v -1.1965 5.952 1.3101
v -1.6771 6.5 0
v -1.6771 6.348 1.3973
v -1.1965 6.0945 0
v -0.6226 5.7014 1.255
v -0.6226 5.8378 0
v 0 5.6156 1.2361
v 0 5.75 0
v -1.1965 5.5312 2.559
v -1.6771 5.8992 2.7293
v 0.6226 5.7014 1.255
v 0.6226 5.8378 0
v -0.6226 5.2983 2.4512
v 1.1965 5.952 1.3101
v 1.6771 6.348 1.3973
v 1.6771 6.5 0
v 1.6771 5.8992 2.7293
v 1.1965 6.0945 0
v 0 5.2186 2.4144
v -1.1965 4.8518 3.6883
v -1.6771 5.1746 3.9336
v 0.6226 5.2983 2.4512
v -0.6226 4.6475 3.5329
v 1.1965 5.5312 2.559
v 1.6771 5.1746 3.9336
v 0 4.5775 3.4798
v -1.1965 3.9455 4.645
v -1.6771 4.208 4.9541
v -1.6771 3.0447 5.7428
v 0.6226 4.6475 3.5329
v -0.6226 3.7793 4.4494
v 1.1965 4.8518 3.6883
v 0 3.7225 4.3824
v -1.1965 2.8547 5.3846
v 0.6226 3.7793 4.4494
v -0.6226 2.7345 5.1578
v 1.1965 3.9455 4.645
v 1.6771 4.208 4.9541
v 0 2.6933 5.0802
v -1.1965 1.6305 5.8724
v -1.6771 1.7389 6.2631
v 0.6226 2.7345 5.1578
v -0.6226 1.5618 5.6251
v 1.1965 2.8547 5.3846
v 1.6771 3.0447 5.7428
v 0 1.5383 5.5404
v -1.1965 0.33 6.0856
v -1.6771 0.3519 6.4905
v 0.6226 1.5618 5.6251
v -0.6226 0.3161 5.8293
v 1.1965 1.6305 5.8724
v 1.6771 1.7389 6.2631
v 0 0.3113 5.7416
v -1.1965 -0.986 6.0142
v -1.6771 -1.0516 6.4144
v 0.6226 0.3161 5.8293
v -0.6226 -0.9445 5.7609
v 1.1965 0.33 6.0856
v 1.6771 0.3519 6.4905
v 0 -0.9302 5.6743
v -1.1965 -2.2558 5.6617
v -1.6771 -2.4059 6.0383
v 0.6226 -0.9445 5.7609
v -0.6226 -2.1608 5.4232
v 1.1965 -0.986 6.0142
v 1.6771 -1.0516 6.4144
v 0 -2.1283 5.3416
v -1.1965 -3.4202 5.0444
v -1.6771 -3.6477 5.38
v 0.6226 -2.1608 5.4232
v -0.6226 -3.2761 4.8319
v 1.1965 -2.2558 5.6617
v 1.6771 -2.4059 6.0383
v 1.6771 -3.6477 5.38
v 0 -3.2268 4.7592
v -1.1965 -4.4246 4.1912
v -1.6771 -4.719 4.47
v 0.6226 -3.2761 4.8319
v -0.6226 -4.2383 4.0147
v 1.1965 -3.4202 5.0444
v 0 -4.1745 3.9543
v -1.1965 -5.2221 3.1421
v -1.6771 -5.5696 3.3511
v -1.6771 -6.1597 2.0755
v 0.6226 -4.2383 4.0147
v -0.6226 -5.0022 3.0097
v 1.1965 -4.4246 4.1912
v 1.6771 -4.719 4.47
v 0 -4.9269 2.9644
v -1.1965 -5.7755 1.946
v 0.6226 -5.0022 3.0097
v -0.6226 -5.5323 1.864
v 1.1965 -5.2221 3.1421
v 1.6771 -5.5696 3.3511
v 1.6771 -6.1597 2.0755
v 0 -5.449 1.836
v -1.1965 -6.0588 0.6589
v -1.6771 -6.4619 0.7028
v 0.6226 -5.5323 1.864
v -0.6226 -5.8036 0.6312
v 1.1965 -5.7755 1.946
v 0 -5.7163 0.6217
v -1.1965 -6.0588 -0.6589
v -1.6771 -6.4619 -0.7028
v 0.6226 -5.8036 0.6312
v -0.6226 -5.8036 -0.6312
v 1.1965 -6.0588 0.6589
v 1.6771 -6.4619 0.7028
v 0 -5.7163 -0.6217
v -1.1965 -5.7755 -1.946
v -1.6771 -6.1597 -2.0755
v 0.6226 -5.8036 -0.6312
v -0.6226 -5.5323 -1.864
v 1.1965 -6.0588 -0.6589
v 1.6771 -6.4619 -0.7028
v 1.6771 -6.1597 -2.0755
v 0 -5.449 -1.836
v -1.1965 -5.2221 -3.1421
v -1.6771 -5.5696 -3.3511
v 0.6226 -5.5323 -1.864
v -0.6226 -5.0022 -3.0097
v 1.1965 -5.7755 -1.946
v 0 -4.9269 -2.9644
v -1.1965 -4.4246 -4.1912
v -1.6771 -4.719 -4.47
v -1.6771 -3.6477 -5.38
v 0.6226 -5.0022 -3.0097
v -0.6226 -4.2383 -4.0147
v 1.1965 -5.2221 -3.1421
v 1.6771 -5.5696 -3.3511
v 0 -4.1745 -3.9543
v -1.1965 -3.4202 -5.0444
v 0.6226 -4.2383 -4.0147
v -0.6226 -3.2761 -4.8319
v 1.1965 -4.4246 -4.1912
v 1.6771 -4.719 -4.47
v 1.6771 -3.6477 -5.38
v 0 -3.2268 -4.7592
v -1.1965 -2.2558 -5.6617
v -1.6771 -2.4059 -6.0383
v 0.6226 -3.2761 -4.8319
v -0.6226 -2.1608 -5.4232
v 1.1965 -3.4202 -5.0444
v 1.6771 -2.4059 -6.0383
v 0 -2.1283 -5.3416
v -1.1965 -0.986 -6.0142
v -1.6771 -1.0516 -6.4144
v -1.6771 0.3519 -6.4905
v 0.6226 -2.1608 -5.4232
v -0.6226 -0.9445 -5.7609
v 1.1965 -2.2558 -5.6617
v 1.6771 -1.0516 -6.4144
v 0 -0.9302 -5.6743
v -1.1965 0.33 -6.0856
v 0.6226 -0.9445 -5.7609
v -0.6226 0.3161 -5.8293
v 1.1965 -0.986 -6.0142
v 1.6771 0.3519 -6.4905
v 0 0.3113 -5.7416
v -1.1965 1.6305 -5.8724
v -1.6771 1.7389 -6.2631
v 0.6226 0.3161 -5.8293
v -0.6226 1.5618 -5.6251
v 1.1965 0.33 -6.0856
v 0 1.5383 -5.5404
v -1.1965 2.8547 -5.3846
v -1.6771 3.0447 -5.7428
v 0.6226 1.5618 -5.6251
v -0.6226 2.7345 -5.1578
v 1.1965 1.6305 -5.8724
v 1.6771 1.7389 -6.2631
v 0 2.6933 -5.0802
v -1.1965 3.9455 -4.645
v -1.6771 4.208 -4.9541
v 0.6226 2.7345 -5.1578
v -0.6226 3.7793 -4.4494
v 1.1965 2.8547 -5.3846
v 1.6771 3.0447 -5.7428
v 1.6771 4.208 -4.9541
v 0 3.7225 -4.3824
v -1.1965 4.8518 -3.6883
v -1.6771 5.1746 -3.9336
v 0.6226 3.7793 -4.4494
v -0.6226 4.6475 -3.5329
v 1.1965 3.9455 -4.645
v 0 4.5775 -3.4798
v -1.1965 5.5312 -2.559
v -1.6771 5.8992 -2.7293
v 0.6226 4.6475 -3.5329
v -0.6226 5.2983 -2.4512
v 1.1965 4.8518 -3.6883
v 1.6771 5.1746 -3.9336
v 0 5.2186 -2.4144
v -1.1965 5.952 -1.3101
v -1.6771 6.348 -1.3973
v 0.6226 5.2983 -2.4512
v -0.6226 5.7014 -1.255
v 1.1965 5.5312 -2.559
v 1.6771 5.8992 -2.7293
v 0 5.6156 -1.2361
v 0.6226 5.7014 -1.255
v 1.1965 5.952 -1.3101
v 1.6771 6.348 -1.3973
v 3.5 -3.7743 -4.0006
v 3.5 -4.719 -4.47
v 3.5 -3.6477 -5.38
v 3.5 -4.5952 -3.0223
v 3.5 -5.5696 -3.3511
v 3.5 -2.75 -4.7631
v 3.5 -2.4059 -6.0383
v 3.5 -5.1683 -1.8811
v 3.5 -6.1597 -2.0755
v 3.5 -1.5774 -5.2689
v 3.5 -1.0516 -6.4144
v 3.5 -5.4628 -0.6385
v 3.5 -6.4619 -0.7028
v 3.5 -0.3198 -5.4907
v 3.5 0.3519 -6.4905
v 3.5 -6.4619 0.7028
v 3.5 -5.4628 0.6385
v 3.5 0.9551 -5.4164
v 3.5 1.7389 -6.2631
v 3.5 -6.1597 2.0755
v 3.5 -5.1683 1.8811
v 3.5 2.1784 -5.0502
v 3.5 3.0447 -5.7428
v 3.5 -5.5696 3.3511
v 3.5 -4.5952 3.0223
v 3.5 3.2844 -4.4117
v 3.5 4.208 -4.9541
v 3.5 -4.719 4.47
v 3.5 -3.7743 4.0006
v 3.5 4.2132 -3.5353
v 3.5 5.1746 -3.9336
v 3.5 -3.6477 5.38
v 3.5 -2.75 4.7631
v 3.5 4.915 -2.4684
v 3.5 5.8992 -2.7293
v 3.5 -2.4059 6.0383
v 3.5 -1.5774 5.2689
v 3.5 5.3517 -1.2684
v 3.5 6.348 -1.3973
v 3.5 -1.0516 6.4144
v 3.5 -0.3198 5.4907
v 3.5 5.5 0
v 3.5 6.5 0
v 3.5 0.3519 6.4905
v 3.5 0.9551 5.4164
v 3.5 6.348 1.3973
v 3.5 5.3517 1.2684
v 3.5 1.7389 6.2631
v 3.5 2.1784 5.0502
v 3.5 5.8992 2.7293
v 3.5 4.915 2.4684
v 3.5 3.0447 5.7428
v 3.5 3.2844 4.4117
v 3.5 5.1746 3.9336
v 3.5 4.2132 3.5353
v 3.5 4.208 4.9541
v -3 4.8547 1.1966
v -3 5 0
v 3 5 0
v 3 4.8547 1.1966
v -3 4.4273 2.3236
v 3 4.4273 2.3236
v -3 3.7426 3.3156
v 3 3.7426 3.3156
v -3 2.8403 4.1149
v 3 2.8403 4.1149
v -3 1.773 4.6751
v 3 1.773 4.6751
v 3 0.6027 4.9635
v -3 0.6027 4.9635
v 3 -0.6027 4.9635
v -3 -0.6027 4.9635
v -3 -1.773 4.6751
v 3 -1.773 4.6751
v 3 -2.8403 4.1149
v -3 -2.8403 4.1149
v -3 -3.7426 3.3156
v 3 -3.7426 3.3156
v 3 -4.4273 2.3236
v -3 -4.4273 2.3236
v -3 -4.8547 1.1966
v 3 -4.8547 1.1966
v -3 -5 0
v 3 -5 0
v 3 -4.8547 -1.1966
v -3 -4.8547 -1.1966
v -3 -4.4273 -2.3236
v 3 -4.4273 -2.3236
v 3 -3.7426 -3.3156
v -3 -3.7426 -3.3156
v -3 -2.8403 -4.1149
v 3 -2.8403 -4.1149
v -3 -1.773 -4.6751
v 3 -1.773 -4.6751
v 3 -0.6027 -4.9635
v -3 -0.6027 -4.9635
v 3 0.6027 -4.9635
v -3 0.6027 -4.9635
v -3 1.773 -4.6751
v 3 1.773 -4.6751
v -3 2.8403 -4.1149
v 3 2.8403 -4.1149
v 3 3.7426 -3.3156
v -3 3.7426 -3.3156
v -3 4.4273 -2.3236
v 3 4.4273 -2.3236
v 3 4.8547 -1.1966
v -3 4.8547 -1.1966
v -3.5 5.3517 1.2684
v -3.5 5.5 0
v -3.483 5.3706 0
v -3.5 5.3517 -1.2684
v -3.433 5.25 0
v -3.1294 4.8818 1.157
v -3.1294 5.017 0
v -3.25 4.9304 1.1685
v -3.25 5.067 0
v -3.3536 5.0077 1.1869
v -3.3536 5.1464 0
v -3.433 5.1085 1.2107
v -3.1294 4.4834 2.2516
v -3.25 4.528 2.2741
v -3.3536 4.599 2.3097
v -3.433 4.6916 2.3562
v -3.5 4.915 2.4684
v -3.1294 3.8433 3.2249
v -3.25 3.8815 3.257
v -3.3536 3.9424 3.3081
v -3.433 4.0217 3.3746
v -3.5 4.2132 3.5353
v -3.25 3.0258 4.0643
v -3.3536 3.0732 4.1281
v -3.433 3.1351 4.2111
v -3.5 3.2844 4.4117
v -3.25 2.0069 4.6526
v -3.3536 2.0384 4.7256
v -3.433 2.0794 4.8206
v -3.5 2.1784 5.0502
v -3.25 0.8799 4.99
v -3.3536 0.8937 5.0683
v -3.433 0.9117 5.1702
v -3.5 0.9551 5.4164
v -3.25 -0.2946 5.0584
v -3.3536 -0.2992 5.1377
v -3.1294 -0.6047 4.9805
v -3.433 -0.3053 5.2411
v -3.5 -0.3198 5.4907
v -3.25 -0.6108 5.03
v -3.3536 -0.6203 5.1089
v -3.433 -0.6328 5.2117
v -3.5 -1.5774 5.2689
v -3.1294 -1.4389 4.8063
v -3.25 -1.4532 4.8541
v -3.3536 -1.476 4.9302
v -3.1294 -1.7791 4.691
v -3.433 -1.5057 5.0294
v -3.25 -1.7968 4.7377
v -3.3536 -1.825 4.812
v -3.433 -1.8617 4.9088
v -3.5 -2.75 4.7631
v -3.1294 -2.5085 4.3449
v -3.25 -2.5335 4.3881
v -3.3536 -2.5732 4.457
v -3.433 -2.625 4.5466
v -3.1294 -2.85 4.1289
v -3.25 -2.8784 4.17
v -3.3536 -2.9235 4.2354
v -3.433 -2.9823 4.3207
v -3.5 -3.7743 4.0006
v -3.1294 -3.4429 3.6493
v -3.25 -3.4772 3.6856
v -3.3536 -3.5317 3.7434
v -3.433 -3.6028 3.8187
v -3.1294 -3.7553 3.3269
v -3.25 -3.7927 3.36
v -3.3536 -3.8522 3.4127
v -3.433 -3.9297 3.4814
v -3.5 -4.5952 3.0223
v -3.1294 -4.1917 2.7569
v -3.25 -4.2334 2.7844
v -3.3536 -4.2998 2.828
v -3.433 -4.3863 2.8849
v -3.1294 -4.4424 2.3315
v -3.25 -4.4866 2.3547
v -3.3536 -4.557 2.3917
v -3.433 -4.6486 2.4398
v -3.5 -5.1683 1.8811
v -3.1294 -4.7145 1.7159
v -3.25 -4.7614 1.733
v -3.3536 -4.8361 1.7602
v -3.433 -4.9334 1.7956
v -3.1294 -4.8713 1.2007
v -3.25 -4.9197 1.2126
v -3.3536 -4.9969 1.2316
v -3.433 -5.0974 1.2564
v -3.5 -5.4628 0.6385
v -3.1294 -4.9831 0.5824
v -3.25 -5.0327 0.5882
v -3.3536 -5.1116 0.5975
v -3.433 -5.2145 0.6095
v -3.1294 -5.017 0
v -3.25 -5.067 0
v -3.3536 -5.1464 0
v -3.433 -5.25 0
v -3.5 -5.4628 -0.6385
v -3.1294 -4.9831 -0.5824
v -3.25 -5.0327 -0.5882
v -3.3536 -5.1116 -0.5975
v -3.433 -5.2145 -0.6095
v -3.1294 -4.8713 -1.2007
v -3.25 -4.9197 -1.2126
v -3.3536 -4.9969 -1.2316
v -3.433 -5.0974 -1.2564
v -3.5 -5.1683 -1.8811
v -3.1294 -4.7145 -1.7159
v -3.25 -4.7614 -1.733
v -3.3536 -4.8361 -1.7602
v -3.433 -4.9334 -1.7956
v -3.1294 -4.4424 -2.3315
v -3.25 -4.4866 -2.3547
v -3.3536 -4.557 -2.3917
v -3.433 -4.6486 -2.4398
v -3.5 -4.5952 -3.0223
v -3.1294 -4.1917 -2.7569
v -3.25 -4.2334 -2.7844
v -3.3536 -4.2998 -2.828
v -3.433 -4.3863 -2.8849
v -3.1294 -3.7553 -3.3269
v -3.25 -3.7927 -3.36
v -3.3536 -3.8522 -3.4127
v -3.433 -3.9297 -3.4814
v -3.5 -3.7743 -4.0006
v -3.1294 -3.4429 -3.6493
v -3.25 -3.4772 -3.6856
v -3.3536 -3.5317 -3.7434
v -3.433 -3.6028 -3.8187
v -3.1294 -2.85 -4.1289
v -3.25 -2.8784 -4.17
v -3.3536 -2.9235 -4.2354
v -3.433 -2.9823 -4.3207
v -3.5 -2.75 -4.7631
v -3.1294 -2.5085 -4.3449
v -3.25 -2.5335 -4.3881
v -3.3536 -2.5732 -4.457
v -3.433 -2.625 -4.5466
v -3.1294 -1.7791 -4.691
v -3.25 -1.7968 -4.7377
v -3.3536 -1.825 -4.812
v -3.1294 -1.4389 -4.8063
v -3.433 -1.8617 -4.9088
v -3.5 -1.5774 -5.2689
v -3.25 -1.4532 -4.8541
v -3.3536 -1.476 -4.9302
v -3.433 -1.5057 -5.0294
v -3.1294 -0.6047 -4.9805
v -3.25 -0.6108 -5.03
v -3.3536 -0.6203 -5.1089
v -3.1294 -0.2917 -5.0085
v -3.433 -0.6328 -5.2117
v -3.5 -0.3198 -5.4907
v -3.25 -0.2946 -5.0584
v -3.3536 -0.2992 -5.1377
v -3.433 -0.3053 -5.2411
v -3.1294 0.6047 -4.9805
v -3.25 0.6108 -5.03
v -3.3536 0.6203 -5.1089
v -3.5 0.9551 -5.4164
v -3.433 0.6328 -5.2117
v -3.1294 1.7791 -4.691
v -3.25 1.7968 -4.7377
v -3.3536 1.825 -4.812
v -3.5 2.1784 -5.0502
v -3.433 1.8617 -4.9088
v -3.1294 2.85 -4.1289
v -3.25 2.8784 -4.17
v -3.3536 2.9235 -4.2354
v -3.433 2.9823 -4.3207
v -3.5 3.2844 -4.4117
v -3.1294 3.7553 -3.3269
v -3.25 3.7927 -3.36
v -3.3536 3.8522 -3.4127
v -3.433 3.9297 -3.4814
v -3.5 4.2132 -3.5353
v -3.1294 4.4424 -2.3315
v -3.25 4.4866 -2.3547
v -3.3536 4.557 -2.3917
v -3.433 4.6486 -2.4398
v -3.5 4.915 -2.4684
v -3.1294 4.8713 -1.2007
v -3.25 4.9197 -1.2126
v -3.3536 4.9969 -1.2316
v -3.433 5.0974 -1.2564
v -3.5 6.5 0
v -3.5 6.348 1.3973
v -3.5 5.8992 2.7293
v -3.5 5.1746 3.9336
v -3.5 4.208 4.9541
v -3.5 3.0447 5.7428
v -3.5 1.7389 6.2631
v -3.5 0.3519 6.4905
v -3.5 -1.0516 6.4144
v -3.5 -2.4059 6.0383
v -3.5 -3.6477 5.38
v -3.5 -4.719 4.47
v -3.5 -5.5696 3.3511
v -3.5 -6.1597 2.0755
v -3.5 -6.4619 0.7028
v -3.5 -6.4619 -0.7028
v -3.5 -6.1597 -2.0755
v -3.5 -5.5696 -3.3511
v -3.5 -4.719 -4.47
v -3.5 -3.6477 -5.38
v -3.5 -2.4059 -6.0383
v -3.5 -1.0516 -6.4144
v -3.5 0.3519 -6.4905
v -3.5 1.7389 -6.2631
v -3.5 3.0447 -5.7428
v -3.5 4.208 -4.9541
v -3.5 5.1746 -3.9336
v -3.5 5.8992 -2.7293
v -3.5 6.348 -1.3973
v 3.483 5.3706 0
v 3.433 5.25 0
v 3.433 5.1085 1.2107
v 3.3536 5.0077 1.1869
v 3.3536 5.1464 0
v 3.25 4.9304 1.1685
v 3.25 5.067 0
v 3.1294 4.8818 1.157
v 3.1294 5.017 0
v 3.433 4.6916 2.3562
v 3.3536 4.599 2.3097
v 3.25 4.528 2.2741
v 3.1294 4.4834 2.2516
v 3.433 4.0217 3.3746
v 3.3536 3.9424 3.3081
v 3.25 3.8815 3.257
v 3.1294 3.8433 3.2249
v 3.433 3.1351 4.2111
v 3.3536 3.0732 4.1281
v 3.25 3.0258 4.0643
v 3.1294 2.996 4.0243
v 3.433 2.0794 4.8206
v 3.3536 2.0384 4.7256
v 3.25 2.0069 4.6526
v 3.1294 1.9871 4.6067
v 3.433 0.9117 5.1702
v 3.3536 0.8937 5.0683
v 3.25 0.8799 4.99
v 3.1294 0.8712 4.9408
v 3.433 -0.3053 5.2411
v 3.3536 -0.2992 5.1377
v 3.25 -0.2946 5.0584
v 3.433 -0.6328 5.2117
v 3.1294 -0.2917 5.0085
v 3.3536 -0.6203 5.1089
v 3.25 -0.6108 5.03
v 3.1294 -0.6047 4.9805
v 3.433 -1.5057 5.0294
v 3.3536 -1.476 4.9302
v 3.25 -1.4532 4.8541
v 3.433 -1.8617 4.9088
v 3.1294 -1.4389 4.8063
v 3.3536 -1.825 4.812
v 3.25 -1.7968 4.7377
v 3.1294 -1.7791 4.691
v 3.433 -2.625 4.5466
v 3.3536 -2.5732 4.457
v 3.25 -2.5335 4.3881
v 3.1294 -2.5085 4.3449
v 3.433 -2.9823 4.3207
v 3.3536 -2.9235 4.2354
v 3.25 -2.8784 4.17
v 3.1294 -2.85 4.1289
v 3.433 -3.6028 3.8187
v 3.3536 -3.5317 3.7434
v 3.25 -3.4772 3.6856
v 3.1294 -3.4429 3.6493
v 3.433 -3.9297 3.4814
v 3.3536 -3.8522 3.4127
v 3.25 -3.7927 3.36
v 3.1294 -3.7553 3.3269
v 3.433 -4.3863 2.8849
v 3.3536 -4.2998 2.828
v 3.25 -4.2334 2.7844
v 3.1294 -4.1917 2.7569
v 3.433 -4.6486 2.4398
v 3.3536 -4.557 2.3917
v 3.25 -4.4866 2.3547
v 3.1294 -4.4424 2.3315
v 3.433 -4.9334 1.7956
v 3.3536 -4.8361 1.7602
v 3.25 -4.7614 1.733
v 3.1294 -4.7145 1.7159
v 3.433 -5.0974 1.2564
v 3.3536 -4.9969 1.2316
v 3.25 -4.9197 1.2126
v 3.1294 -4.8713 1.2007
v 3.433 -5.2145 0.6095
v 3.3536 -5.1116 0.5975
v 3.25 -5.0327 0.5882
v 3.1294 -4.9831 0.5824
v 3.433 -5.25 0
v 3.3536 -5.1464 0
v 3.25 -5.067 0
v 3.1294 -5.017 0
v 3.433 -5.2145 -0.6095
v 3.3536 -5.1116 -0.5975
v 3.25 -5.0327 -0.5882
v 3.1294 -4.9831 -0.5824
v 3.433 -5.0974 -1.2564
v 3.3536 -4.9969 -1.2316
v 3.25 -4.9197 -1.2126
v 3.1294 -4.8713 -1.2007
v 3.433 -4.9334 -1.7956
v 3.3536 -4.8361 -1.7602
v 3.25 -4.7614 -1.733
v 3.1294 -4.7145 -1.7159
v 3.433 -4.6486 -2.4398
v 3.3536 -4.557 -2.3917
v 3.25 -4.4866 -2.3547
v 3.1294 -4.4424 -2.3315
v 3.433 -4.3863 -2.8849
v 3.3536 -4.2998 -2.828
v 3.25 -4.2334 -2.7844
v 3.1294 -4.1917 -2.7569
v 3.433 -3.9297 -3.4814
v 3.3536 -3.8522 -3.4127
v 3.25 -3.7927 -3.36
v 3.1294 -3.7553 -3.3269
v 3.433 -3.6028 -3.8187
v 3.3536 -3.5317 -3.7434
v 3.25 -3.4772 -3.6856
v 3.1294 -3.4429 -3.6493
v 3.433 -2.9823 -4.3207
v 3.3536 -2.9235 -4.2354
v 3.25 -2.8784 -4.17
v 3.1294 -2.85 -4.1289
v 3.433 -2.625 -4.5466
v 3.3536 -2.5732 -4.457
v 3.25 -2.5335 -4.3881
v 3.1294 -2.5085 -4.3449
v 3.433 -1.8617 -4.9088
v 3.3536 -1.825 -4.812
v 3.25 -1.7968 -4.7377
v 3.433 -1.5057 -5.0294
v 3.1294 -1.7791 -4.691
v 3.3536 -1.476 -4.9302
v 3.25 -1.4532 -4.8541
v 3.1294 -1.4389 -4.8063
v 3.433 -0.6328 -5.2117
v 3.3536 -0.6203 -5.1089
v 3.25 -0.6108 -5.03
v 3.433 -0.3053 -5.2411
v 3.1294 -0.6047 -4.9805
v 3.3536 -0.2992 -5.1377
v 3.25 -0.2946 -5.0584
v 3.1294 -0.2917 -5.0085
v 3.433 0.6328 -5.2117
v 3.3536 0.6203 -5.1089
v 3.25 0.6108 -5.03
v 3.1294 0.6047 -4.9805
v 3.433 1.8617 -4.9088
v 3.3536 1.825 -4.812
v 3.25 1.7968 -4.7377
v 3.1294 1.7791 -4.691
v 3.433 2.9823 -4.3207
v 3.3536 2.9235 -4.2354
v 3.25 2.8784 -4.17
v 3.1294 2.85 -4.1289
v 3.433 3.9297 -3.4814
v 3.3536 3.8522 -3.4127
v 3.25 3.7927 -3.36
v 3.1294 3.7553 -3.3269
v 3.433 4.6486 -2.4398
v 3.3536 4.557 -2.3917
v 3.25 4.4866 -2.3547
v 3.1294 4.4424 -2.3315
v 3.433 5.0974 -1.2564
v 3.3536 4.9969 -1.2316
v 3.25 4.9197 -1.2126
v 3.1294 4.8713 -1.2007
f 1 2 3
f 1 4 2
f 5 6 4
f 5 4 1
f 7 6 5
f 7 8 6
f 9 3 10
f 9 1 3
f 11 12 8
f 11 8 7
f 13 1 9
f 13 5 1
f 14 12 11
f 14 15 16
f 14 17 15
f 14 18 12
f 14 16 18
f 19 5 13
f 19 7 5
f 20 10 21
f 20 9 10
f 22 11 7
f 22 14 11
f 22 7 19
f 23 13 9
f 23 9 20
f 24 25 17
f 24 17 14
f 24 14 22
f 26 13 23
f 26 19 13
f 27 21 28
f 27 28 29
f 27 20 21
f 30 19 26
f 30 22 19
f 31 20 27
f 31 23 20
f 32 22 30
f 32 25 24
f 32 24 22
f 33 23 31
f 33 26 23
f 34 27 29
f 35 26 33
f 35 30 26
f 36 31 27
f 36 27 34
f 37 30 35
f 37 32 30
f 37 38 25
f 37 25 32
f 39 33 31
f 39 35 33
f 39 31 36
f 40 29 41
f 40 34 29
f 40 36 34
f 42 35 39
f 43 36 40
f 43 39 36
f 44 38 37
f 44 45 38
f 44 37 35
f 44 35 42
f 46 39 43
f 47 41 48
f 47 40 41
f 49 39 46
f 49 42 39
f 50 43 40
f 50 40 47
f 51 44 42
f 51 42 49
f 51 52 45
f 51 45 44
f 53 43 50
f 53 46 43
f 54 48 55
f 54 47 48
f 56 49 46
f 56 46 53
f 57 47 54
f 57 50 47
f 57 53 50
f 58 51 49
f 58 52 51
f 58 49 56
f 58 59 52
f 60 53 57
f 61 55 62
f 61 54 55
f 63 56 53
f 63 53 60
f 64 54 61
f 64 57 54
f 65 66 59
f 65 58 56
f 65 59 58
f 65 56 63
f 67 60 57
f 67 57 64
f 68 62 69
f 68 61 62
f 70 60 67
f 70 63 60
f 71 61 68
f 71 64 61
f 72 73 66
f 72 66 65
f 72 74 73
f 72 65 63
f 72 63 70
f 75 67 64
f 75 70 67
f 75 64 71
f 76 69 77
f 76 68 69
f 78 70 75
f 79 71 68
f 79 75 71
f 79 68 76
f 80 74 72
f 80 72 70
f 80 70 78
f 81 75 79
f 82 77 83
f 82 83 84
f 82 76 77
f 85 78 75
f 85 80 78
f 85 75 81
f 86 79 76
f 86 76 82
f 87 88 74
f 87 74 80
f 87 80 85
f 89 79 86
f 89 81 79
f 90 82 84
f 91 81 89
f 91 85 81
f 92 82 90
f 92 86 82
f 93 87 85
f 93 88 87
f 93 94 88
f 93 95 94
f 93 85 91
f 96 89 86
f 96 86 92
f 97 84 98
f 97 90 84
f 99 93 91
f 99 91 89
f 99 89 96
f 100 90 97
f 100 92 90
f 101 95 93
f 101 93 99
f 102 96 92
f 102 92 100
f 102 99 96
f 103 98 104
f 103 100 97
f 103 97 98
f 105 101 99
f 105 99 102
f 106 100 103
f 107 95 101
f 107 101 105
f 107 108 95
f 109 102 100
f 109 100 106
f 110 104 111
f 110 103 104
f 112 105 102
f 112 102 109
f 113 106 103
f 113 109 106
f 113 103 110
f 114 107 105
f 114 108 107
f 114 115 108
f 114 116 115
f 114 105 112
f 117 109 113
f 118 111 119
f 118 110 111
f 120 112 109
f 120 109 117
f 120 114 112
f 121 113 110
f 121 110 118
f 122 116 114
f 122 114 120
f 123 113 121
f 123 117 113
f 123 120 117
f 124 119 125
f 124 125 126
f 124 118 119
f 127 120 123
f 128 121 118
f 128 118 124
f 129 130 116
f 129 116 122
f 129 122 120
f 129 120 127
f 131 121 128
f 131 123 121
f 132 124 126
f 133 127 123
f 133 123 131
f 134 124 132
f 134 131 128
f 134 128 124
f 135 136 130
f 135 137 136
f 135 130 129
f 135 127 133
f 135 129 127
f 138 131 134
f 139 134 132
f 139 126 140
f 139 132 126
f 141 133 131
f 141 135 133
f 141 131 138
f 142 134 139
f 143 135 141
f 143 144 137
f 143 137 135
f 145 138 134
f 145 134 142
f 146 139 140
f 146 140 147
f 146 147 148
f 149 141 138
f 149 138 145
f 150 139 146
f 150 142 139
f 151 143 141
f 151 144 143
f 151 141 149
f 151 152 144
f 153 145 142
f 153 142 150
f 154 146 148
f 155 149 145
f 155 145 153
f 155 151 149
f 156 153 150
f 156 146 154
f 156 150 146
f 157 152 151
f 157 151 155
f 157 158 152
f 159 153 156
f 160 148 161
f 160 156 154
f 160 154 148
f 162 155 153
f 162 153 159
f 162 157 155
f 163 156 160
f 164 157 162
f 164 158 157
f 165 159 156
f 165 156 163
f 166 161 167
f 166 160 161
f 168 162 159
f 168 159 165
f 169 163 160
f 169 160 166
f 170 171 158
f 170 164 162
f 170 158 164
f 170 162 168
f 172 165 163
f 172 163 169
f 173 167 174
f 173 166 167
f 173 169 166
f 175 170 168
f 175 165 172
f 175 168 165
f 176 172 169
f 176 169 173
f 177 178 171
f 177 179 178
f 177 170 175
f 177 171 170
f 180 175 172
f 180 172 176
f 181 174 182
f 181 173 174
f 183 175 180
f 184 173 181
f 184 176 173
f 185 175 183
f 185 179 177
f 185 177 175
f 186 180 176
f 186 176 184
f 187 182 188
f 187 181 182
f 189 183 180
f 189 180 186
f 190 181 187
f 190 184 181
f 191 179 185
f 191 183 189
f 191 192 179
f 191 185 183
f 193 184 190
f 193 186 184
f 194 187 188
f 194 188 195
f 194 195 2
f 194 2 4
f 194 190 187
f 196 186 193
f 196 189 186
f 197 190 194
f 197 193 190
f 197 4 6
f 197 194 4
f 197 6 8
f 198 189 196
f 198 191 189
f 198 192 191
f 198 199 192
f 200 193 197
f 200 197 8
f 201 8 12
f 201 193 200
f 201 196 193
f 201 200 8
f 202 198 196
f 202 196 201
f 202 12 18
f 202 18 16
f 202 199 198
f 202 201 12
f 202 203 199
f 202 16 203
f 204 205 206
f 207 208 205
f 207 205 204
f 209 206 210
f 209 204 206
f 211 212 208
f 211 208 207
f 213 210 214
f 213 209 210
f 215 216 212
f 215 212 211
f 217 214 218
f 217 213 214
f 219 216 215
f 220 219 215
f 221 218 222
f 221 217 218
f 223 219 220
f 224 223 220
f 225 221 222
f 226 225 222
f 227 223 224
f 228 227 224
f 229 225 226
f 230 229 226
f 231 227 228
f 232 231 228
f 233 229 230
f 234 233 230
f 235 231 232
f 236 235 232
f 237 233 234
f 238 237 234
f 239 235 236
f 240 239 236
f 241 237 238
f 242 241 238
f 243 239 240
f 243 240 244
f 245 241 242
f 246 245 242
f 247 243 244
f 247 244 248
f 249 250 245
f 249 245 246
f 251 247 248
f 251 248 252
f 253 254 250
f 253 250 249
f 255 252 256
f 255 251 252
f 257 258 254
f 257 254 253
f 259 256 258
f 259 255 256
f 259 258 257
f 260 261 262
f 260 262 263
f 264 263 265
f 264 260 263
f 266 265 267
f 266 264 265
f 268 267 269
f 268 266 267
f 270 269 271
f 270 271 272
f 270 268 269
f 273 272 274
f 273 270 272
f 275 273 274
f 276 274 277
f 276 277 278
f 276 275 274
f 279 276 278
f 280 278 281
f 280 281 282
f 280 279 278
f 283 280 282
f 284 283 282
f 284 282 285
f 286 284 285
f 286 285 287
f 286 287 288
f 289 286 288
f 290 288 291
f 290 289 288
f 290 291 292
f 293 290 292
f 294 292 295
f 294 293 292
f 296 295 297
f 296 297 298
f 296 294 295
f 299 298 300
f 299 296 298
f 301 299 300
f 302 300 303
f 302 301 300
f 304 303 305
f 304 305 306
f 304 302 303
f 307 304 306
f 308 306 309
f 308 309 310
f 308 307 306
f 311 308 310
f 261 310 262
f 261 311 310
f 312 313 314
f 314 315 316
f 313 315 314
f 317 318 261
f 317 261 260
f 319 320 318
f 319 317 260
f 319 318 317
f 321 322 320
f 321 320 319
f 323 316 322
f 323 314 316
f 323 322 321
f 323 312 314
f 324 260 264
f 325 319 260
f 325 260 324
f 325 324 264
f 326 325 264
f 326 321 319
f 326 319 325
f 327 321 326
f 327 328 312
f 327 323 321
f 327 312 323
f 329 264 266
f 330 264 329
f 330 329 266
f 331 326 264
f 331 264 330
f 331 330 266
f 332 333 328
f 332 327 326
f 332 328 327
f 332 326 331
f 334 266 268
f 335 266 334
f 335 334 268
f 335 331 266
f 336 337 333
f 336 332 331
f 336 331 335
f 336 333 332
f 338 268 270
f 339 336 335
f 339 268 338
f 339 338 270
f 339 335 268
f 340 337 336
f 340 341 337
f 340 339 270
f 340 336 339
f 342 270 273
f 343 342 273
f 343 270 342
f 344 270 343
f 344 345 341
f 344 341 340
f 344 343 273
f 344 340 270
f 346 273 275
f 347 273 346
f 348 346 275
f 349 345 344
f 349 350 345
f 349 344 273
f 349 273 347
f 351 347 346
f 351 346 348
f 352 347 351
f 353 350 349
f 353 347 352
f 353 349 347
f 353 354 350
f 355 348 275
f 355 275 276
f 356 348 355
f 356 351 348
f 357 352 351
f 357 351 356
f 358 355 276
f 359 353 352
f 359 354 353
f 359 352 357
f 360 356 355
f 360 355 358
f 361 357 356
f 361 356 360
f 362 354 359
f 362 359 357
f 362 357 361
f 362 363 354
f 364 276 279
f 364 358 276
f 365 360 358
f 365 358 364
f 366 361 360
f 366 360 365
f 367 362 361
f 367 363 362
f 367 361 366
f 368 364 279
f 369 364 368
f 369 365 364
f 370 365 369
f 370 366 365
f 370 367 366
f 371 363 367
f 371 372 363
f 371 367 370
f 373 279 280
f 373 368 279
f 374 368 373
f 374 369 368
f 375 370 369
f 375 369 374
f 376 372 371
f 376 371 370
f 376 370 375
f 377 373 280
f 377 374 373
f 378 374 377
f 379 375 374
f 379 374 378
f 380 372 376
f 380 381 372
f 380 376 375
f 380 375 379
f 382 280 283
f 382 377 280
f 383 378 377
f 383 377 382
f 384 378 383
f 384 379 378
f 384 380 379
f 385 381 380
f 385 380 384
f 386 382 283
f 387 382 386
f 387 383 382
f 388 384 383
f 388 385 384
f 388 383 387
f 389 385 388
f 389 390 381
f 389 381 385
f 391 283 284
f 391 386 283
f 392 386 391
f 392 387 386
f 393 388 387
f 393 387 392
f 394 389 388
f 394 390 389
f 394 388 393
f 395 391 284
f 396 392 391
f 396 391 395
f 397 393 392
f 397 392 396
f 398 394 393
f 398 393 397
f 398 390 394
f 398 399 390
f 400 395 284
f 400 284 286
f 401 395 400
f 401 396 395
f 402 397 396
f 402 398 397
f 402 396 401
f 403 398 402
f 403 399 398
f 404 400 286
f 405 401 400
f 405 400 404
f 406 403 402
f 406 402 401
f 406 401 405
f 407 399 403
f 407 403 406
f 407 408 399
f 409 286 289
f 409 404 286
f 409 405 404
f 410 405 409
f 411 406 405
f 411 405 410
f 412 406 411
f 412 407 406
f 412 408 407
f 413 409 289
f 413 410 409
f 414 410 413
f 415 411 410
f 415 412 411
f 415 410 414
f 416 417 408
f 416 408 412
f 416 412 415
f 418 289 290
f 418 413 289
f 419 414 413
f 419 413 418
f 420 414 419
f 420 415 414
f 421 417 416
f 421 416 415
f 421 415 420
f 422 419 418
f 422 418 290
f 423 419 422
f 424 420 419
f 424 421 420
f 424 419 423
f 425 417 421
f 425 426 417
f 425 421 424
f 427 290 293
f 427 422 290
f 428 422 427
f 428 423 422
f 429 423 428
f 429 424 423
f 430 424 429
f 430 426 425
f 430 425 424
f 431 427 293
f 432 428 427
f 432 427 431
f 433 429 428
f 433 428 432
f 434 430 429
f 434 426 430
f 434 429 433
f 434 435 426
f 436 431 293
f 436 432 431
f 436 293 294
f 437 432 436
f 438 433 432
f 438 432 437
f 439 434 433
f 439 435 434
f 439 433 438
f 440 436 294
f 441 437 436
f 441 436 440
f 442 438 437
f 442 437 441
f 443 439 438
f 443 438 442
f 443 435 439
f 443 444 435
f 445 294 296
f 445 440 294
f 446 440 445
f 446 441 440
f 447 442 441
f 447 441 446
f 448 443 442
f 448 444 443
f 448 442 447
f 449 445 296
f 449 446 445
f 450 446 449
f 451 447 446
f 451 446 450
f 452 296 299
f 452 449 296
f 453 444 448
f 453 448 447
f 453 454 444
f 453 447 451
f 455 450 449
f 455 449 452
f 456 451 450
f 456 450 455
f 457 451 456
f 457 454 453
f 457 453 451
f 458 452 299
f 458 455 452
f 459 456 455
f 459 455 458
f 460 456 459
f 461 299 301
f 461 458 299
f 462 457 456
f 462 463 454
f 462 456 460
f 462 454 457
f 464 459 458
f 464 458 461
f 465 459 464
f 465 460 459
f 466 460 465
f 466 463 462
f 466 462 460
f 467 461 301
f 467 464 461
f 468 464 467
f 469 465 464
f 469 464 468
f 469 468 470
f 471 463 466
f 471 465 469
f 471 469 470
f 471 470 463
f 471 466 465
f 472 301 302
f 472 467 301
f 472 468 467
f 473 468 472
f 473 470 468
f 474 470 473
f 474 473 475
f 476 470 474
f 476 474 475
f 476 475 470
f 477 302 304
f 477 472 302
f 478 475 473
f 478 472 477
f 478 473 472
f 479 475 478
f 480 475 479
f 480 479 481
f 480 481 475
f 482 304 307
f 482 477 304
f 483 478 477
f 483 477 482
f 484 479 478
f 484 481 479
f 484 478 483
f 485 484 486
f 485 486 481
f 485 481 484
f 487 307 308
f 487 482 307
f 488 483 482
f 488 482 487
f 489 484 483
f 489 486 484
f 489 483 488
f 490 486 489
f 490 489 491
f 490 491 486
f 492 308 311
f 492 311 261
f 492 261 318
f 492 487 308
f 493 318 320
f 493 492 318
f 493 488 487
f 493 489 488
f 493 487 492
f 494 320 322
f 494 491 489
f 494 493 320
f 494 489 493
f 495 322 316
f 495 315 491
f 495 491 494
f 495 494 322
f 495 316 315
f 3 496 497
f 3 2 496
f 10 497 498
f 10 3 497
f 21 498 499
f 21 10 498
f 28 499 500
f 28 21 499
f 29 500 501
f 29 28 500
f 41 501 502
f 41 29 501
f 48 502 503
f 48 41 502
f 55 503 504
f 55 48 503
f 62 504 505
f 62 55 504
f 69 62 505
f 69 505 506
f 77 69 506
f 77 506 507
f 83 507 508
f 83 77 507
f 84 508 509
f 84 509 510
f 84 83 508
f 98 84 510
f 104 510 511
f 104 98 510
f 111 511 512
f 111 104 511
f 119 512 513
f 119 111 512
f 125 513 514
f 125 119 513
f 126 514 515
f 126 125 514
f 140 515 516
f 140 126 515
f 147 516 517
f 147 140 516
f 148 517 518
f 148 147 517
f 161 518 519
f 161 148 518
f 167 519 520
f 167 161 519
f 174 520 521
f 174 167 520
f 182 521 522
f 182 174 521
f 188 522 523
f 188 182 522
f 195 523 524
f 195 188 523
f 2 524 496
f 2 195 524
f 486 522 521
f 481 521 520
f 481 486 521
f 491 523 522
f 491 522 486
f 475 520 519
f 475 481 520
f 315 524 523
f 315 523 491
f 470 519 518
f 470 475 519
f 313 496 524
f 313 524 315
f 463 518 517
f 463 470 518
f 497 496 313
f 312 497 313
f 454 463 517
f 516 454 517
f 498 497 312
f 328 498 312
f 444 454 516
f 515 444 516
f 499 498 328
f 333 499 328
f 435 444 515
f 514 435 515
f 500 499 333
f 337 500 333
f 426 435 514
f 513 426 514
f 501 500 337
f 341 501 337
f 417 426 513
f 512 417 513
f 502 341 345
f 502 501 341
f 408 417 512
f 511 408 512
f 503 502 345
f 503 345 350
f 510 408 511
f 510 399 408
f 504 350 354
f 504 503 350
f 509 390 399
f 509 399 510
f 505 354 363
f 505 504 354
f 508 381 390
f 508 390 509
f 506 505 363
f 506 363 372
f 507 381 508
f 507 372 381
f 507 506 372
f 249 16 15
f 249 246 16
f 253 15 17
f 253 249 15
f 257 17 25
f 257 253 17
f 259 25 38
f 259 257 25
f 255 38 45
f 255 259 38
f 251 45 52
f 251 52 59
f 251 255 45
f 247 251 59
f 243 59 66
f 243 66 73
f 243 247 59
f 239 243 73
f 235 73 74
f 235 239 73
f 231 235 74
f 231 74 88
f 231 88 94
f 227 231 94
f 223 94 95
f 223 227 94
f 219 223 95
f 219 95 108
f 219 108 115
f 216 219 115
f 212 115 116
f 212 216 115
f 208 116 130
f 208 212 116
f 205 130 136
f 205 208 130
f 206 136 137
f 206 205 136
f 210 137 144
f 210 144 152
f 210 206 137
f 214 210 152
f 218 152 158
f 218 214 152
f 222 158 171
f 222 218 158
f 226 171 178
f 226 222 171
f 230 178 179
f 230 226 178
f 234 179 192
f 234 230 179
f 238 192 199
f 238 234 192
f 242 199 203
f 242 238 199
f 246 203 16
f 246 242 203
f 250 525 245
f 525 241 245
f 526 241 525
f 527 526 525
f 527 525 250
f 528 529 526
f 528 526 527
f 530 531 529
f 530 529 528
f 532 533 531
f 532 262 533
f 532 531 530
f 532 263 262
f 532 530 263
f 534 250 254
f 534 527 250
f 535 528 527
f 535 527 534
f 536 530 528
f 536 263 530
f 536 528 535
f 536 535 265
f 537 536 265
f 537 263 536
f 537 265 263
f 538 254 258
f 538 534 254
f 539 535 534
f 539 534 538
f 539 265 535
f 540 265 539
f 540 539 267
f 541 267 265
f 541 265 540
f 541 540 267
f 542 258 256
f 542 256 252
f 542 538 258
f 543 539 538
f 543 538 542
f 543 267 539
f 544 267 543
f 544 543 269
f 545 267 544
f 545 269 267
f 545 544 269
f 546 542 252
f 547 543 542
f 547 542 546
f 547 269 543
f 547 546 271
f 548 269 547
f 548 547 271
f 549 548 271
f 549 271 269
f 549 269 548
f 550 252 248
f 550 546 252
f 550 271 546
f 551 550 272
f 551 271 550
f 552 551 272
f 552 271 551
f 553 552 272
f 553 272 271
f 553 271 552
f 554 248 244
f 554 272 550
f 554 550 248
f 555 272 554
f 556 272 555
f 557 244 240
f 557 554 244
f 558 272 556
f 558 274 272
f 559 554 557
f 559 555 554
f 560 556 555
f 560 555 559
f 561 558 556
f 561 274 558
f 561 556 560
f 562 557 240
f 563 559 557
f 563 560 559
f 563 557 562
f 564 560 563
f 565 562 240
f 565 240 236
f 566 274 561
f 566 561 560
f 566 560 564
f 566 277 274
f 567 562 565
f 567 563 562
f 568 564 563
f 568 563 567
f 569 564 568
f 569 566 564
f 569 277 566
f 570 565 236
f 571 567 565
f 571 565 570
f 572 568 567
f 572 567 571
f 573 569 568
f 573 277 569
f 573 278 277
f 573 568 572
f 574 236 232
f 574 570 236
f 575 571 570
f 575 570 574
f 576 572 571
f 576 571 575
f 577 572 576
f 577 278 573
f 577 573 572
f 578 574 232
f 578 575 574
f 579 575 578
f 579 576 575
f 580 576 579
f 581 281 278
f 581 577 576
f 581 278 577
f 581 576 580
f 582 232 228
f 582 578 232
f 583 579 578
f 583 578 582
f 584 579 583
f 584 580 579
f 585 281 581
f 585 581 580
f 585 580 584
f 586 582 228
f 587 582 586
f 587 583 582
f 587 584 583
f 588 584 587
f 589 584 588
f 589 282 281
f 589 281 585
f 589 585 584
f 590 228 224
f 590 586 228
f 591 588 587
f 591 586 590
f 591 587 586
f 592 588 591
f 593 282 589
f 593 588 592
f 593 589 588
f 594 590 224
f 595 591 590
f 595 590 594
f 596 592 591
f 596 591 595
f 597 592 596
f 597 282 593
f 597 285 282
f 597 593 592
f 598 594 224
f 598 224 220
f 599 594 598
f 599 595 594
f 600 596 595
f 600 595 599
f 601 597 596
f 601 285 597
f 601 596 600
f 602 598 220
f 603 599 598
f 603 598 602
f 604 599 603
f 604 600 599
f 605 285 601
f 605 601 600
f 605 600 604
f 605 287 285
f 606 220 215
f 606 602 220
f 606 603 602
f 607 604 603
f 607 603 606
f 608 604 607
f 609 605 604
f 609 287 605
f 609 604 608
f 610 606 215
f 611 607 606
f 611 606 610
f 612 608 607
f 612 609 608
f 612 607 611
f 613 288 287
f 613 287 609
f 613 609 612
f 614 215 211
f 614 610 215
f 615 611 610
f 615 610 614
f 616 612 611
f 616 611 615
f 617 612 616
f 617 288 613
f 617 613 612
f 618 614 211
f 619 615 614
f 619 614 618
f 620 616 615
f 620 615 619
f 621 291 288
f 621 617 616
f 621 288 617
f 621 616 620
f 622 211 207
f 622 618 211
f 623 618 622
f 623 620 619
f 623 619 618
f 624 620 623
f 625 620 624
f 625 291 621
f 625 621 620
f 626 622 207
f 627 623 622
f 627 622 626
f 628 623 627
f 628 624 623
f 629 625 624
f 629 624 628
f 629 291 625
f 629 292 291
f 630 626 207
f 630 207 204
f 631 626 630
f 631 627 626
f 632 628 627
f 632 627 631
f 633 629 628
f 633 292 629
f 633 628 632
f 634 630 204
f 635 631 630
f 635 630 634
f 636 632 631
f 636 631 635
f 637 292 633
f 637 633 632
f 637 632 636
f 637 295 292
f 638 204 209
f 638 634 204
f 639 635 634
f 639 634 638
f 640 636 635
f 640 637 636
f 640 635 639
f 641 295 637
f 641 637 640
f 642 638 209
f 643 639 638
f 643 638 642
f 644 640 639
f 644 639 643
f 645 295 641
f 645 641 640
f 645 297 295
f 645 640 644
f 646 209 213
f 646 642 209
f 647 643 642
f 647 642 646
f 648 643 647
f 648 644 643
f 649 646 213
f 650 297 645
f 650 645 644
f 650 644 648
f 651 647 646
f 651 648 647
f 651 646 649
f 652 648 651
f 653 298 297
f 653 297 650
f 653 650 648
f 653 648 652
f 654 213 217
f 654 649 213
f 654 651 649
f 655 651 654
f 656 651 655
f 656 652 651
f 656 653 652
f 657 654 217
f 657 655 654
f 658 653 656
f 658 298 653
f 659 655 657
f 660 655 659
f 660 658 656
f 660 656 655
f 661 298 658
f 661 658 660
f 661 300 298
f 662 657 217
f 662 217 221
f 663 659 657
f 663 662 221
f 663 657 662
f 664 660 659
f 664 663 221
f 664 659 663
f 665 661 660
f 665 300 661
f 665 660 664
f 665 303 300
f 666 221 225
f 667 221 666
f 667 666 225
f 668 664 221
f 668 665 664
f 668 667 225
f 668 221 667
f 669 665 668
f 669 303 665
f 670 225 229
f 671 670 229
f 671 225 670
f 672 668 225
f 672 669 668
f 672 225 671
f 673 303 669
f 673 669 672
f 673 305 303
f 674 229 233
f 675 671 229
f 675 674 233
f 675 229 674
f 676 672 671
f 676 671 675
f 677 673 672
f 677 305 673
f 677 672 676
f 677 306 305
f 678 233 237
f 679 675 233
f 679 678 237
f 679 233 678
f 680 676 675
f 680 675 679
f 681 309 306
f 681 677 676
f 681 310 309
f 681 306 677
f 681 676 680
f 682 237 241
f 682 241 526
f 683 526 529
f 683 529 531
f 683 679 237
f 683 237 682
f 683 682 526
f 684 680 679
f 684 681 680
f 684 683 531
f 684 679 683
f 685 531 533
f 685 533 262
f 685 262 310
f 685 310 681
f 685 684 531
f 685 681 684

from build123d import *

# Parameters (mm, degrees)
FILLET1_R = 0.5


with BuildPart() as part:
    # Sketch1 → Revolve1 (revolve)
    with BuildSketch(Plane.XY):
        with BuildLine():
            Line((1.677050983, 6.5), (3.5, 6.5))
            Line((3.5, 6.5), (3.5, 5))
            Line((3.5, 5), (-3.5, 5))
            Line((-3.5, 5), (-3.5, 6.5))
            Line((-3.5, 6.5), (-1.677050983, 6.5))
            ThreePointArc((-1.677050983, 6.5), (0, 5.75), (1.677050983, 6.5))
        make_face()
    revolve(axis=Axis((-42.390929705, 0, 0), (1, 0, 0)))

    # Fillet1
    fillet1_edges = [part.edges().sort_by_distance(p)[0] for p in [
        (3.5, -5, 0),
        (-3.5, -5, 0),
    ]]
    fillet(fillet1_edges, radius=FILLET1_R)


solid = part.part
